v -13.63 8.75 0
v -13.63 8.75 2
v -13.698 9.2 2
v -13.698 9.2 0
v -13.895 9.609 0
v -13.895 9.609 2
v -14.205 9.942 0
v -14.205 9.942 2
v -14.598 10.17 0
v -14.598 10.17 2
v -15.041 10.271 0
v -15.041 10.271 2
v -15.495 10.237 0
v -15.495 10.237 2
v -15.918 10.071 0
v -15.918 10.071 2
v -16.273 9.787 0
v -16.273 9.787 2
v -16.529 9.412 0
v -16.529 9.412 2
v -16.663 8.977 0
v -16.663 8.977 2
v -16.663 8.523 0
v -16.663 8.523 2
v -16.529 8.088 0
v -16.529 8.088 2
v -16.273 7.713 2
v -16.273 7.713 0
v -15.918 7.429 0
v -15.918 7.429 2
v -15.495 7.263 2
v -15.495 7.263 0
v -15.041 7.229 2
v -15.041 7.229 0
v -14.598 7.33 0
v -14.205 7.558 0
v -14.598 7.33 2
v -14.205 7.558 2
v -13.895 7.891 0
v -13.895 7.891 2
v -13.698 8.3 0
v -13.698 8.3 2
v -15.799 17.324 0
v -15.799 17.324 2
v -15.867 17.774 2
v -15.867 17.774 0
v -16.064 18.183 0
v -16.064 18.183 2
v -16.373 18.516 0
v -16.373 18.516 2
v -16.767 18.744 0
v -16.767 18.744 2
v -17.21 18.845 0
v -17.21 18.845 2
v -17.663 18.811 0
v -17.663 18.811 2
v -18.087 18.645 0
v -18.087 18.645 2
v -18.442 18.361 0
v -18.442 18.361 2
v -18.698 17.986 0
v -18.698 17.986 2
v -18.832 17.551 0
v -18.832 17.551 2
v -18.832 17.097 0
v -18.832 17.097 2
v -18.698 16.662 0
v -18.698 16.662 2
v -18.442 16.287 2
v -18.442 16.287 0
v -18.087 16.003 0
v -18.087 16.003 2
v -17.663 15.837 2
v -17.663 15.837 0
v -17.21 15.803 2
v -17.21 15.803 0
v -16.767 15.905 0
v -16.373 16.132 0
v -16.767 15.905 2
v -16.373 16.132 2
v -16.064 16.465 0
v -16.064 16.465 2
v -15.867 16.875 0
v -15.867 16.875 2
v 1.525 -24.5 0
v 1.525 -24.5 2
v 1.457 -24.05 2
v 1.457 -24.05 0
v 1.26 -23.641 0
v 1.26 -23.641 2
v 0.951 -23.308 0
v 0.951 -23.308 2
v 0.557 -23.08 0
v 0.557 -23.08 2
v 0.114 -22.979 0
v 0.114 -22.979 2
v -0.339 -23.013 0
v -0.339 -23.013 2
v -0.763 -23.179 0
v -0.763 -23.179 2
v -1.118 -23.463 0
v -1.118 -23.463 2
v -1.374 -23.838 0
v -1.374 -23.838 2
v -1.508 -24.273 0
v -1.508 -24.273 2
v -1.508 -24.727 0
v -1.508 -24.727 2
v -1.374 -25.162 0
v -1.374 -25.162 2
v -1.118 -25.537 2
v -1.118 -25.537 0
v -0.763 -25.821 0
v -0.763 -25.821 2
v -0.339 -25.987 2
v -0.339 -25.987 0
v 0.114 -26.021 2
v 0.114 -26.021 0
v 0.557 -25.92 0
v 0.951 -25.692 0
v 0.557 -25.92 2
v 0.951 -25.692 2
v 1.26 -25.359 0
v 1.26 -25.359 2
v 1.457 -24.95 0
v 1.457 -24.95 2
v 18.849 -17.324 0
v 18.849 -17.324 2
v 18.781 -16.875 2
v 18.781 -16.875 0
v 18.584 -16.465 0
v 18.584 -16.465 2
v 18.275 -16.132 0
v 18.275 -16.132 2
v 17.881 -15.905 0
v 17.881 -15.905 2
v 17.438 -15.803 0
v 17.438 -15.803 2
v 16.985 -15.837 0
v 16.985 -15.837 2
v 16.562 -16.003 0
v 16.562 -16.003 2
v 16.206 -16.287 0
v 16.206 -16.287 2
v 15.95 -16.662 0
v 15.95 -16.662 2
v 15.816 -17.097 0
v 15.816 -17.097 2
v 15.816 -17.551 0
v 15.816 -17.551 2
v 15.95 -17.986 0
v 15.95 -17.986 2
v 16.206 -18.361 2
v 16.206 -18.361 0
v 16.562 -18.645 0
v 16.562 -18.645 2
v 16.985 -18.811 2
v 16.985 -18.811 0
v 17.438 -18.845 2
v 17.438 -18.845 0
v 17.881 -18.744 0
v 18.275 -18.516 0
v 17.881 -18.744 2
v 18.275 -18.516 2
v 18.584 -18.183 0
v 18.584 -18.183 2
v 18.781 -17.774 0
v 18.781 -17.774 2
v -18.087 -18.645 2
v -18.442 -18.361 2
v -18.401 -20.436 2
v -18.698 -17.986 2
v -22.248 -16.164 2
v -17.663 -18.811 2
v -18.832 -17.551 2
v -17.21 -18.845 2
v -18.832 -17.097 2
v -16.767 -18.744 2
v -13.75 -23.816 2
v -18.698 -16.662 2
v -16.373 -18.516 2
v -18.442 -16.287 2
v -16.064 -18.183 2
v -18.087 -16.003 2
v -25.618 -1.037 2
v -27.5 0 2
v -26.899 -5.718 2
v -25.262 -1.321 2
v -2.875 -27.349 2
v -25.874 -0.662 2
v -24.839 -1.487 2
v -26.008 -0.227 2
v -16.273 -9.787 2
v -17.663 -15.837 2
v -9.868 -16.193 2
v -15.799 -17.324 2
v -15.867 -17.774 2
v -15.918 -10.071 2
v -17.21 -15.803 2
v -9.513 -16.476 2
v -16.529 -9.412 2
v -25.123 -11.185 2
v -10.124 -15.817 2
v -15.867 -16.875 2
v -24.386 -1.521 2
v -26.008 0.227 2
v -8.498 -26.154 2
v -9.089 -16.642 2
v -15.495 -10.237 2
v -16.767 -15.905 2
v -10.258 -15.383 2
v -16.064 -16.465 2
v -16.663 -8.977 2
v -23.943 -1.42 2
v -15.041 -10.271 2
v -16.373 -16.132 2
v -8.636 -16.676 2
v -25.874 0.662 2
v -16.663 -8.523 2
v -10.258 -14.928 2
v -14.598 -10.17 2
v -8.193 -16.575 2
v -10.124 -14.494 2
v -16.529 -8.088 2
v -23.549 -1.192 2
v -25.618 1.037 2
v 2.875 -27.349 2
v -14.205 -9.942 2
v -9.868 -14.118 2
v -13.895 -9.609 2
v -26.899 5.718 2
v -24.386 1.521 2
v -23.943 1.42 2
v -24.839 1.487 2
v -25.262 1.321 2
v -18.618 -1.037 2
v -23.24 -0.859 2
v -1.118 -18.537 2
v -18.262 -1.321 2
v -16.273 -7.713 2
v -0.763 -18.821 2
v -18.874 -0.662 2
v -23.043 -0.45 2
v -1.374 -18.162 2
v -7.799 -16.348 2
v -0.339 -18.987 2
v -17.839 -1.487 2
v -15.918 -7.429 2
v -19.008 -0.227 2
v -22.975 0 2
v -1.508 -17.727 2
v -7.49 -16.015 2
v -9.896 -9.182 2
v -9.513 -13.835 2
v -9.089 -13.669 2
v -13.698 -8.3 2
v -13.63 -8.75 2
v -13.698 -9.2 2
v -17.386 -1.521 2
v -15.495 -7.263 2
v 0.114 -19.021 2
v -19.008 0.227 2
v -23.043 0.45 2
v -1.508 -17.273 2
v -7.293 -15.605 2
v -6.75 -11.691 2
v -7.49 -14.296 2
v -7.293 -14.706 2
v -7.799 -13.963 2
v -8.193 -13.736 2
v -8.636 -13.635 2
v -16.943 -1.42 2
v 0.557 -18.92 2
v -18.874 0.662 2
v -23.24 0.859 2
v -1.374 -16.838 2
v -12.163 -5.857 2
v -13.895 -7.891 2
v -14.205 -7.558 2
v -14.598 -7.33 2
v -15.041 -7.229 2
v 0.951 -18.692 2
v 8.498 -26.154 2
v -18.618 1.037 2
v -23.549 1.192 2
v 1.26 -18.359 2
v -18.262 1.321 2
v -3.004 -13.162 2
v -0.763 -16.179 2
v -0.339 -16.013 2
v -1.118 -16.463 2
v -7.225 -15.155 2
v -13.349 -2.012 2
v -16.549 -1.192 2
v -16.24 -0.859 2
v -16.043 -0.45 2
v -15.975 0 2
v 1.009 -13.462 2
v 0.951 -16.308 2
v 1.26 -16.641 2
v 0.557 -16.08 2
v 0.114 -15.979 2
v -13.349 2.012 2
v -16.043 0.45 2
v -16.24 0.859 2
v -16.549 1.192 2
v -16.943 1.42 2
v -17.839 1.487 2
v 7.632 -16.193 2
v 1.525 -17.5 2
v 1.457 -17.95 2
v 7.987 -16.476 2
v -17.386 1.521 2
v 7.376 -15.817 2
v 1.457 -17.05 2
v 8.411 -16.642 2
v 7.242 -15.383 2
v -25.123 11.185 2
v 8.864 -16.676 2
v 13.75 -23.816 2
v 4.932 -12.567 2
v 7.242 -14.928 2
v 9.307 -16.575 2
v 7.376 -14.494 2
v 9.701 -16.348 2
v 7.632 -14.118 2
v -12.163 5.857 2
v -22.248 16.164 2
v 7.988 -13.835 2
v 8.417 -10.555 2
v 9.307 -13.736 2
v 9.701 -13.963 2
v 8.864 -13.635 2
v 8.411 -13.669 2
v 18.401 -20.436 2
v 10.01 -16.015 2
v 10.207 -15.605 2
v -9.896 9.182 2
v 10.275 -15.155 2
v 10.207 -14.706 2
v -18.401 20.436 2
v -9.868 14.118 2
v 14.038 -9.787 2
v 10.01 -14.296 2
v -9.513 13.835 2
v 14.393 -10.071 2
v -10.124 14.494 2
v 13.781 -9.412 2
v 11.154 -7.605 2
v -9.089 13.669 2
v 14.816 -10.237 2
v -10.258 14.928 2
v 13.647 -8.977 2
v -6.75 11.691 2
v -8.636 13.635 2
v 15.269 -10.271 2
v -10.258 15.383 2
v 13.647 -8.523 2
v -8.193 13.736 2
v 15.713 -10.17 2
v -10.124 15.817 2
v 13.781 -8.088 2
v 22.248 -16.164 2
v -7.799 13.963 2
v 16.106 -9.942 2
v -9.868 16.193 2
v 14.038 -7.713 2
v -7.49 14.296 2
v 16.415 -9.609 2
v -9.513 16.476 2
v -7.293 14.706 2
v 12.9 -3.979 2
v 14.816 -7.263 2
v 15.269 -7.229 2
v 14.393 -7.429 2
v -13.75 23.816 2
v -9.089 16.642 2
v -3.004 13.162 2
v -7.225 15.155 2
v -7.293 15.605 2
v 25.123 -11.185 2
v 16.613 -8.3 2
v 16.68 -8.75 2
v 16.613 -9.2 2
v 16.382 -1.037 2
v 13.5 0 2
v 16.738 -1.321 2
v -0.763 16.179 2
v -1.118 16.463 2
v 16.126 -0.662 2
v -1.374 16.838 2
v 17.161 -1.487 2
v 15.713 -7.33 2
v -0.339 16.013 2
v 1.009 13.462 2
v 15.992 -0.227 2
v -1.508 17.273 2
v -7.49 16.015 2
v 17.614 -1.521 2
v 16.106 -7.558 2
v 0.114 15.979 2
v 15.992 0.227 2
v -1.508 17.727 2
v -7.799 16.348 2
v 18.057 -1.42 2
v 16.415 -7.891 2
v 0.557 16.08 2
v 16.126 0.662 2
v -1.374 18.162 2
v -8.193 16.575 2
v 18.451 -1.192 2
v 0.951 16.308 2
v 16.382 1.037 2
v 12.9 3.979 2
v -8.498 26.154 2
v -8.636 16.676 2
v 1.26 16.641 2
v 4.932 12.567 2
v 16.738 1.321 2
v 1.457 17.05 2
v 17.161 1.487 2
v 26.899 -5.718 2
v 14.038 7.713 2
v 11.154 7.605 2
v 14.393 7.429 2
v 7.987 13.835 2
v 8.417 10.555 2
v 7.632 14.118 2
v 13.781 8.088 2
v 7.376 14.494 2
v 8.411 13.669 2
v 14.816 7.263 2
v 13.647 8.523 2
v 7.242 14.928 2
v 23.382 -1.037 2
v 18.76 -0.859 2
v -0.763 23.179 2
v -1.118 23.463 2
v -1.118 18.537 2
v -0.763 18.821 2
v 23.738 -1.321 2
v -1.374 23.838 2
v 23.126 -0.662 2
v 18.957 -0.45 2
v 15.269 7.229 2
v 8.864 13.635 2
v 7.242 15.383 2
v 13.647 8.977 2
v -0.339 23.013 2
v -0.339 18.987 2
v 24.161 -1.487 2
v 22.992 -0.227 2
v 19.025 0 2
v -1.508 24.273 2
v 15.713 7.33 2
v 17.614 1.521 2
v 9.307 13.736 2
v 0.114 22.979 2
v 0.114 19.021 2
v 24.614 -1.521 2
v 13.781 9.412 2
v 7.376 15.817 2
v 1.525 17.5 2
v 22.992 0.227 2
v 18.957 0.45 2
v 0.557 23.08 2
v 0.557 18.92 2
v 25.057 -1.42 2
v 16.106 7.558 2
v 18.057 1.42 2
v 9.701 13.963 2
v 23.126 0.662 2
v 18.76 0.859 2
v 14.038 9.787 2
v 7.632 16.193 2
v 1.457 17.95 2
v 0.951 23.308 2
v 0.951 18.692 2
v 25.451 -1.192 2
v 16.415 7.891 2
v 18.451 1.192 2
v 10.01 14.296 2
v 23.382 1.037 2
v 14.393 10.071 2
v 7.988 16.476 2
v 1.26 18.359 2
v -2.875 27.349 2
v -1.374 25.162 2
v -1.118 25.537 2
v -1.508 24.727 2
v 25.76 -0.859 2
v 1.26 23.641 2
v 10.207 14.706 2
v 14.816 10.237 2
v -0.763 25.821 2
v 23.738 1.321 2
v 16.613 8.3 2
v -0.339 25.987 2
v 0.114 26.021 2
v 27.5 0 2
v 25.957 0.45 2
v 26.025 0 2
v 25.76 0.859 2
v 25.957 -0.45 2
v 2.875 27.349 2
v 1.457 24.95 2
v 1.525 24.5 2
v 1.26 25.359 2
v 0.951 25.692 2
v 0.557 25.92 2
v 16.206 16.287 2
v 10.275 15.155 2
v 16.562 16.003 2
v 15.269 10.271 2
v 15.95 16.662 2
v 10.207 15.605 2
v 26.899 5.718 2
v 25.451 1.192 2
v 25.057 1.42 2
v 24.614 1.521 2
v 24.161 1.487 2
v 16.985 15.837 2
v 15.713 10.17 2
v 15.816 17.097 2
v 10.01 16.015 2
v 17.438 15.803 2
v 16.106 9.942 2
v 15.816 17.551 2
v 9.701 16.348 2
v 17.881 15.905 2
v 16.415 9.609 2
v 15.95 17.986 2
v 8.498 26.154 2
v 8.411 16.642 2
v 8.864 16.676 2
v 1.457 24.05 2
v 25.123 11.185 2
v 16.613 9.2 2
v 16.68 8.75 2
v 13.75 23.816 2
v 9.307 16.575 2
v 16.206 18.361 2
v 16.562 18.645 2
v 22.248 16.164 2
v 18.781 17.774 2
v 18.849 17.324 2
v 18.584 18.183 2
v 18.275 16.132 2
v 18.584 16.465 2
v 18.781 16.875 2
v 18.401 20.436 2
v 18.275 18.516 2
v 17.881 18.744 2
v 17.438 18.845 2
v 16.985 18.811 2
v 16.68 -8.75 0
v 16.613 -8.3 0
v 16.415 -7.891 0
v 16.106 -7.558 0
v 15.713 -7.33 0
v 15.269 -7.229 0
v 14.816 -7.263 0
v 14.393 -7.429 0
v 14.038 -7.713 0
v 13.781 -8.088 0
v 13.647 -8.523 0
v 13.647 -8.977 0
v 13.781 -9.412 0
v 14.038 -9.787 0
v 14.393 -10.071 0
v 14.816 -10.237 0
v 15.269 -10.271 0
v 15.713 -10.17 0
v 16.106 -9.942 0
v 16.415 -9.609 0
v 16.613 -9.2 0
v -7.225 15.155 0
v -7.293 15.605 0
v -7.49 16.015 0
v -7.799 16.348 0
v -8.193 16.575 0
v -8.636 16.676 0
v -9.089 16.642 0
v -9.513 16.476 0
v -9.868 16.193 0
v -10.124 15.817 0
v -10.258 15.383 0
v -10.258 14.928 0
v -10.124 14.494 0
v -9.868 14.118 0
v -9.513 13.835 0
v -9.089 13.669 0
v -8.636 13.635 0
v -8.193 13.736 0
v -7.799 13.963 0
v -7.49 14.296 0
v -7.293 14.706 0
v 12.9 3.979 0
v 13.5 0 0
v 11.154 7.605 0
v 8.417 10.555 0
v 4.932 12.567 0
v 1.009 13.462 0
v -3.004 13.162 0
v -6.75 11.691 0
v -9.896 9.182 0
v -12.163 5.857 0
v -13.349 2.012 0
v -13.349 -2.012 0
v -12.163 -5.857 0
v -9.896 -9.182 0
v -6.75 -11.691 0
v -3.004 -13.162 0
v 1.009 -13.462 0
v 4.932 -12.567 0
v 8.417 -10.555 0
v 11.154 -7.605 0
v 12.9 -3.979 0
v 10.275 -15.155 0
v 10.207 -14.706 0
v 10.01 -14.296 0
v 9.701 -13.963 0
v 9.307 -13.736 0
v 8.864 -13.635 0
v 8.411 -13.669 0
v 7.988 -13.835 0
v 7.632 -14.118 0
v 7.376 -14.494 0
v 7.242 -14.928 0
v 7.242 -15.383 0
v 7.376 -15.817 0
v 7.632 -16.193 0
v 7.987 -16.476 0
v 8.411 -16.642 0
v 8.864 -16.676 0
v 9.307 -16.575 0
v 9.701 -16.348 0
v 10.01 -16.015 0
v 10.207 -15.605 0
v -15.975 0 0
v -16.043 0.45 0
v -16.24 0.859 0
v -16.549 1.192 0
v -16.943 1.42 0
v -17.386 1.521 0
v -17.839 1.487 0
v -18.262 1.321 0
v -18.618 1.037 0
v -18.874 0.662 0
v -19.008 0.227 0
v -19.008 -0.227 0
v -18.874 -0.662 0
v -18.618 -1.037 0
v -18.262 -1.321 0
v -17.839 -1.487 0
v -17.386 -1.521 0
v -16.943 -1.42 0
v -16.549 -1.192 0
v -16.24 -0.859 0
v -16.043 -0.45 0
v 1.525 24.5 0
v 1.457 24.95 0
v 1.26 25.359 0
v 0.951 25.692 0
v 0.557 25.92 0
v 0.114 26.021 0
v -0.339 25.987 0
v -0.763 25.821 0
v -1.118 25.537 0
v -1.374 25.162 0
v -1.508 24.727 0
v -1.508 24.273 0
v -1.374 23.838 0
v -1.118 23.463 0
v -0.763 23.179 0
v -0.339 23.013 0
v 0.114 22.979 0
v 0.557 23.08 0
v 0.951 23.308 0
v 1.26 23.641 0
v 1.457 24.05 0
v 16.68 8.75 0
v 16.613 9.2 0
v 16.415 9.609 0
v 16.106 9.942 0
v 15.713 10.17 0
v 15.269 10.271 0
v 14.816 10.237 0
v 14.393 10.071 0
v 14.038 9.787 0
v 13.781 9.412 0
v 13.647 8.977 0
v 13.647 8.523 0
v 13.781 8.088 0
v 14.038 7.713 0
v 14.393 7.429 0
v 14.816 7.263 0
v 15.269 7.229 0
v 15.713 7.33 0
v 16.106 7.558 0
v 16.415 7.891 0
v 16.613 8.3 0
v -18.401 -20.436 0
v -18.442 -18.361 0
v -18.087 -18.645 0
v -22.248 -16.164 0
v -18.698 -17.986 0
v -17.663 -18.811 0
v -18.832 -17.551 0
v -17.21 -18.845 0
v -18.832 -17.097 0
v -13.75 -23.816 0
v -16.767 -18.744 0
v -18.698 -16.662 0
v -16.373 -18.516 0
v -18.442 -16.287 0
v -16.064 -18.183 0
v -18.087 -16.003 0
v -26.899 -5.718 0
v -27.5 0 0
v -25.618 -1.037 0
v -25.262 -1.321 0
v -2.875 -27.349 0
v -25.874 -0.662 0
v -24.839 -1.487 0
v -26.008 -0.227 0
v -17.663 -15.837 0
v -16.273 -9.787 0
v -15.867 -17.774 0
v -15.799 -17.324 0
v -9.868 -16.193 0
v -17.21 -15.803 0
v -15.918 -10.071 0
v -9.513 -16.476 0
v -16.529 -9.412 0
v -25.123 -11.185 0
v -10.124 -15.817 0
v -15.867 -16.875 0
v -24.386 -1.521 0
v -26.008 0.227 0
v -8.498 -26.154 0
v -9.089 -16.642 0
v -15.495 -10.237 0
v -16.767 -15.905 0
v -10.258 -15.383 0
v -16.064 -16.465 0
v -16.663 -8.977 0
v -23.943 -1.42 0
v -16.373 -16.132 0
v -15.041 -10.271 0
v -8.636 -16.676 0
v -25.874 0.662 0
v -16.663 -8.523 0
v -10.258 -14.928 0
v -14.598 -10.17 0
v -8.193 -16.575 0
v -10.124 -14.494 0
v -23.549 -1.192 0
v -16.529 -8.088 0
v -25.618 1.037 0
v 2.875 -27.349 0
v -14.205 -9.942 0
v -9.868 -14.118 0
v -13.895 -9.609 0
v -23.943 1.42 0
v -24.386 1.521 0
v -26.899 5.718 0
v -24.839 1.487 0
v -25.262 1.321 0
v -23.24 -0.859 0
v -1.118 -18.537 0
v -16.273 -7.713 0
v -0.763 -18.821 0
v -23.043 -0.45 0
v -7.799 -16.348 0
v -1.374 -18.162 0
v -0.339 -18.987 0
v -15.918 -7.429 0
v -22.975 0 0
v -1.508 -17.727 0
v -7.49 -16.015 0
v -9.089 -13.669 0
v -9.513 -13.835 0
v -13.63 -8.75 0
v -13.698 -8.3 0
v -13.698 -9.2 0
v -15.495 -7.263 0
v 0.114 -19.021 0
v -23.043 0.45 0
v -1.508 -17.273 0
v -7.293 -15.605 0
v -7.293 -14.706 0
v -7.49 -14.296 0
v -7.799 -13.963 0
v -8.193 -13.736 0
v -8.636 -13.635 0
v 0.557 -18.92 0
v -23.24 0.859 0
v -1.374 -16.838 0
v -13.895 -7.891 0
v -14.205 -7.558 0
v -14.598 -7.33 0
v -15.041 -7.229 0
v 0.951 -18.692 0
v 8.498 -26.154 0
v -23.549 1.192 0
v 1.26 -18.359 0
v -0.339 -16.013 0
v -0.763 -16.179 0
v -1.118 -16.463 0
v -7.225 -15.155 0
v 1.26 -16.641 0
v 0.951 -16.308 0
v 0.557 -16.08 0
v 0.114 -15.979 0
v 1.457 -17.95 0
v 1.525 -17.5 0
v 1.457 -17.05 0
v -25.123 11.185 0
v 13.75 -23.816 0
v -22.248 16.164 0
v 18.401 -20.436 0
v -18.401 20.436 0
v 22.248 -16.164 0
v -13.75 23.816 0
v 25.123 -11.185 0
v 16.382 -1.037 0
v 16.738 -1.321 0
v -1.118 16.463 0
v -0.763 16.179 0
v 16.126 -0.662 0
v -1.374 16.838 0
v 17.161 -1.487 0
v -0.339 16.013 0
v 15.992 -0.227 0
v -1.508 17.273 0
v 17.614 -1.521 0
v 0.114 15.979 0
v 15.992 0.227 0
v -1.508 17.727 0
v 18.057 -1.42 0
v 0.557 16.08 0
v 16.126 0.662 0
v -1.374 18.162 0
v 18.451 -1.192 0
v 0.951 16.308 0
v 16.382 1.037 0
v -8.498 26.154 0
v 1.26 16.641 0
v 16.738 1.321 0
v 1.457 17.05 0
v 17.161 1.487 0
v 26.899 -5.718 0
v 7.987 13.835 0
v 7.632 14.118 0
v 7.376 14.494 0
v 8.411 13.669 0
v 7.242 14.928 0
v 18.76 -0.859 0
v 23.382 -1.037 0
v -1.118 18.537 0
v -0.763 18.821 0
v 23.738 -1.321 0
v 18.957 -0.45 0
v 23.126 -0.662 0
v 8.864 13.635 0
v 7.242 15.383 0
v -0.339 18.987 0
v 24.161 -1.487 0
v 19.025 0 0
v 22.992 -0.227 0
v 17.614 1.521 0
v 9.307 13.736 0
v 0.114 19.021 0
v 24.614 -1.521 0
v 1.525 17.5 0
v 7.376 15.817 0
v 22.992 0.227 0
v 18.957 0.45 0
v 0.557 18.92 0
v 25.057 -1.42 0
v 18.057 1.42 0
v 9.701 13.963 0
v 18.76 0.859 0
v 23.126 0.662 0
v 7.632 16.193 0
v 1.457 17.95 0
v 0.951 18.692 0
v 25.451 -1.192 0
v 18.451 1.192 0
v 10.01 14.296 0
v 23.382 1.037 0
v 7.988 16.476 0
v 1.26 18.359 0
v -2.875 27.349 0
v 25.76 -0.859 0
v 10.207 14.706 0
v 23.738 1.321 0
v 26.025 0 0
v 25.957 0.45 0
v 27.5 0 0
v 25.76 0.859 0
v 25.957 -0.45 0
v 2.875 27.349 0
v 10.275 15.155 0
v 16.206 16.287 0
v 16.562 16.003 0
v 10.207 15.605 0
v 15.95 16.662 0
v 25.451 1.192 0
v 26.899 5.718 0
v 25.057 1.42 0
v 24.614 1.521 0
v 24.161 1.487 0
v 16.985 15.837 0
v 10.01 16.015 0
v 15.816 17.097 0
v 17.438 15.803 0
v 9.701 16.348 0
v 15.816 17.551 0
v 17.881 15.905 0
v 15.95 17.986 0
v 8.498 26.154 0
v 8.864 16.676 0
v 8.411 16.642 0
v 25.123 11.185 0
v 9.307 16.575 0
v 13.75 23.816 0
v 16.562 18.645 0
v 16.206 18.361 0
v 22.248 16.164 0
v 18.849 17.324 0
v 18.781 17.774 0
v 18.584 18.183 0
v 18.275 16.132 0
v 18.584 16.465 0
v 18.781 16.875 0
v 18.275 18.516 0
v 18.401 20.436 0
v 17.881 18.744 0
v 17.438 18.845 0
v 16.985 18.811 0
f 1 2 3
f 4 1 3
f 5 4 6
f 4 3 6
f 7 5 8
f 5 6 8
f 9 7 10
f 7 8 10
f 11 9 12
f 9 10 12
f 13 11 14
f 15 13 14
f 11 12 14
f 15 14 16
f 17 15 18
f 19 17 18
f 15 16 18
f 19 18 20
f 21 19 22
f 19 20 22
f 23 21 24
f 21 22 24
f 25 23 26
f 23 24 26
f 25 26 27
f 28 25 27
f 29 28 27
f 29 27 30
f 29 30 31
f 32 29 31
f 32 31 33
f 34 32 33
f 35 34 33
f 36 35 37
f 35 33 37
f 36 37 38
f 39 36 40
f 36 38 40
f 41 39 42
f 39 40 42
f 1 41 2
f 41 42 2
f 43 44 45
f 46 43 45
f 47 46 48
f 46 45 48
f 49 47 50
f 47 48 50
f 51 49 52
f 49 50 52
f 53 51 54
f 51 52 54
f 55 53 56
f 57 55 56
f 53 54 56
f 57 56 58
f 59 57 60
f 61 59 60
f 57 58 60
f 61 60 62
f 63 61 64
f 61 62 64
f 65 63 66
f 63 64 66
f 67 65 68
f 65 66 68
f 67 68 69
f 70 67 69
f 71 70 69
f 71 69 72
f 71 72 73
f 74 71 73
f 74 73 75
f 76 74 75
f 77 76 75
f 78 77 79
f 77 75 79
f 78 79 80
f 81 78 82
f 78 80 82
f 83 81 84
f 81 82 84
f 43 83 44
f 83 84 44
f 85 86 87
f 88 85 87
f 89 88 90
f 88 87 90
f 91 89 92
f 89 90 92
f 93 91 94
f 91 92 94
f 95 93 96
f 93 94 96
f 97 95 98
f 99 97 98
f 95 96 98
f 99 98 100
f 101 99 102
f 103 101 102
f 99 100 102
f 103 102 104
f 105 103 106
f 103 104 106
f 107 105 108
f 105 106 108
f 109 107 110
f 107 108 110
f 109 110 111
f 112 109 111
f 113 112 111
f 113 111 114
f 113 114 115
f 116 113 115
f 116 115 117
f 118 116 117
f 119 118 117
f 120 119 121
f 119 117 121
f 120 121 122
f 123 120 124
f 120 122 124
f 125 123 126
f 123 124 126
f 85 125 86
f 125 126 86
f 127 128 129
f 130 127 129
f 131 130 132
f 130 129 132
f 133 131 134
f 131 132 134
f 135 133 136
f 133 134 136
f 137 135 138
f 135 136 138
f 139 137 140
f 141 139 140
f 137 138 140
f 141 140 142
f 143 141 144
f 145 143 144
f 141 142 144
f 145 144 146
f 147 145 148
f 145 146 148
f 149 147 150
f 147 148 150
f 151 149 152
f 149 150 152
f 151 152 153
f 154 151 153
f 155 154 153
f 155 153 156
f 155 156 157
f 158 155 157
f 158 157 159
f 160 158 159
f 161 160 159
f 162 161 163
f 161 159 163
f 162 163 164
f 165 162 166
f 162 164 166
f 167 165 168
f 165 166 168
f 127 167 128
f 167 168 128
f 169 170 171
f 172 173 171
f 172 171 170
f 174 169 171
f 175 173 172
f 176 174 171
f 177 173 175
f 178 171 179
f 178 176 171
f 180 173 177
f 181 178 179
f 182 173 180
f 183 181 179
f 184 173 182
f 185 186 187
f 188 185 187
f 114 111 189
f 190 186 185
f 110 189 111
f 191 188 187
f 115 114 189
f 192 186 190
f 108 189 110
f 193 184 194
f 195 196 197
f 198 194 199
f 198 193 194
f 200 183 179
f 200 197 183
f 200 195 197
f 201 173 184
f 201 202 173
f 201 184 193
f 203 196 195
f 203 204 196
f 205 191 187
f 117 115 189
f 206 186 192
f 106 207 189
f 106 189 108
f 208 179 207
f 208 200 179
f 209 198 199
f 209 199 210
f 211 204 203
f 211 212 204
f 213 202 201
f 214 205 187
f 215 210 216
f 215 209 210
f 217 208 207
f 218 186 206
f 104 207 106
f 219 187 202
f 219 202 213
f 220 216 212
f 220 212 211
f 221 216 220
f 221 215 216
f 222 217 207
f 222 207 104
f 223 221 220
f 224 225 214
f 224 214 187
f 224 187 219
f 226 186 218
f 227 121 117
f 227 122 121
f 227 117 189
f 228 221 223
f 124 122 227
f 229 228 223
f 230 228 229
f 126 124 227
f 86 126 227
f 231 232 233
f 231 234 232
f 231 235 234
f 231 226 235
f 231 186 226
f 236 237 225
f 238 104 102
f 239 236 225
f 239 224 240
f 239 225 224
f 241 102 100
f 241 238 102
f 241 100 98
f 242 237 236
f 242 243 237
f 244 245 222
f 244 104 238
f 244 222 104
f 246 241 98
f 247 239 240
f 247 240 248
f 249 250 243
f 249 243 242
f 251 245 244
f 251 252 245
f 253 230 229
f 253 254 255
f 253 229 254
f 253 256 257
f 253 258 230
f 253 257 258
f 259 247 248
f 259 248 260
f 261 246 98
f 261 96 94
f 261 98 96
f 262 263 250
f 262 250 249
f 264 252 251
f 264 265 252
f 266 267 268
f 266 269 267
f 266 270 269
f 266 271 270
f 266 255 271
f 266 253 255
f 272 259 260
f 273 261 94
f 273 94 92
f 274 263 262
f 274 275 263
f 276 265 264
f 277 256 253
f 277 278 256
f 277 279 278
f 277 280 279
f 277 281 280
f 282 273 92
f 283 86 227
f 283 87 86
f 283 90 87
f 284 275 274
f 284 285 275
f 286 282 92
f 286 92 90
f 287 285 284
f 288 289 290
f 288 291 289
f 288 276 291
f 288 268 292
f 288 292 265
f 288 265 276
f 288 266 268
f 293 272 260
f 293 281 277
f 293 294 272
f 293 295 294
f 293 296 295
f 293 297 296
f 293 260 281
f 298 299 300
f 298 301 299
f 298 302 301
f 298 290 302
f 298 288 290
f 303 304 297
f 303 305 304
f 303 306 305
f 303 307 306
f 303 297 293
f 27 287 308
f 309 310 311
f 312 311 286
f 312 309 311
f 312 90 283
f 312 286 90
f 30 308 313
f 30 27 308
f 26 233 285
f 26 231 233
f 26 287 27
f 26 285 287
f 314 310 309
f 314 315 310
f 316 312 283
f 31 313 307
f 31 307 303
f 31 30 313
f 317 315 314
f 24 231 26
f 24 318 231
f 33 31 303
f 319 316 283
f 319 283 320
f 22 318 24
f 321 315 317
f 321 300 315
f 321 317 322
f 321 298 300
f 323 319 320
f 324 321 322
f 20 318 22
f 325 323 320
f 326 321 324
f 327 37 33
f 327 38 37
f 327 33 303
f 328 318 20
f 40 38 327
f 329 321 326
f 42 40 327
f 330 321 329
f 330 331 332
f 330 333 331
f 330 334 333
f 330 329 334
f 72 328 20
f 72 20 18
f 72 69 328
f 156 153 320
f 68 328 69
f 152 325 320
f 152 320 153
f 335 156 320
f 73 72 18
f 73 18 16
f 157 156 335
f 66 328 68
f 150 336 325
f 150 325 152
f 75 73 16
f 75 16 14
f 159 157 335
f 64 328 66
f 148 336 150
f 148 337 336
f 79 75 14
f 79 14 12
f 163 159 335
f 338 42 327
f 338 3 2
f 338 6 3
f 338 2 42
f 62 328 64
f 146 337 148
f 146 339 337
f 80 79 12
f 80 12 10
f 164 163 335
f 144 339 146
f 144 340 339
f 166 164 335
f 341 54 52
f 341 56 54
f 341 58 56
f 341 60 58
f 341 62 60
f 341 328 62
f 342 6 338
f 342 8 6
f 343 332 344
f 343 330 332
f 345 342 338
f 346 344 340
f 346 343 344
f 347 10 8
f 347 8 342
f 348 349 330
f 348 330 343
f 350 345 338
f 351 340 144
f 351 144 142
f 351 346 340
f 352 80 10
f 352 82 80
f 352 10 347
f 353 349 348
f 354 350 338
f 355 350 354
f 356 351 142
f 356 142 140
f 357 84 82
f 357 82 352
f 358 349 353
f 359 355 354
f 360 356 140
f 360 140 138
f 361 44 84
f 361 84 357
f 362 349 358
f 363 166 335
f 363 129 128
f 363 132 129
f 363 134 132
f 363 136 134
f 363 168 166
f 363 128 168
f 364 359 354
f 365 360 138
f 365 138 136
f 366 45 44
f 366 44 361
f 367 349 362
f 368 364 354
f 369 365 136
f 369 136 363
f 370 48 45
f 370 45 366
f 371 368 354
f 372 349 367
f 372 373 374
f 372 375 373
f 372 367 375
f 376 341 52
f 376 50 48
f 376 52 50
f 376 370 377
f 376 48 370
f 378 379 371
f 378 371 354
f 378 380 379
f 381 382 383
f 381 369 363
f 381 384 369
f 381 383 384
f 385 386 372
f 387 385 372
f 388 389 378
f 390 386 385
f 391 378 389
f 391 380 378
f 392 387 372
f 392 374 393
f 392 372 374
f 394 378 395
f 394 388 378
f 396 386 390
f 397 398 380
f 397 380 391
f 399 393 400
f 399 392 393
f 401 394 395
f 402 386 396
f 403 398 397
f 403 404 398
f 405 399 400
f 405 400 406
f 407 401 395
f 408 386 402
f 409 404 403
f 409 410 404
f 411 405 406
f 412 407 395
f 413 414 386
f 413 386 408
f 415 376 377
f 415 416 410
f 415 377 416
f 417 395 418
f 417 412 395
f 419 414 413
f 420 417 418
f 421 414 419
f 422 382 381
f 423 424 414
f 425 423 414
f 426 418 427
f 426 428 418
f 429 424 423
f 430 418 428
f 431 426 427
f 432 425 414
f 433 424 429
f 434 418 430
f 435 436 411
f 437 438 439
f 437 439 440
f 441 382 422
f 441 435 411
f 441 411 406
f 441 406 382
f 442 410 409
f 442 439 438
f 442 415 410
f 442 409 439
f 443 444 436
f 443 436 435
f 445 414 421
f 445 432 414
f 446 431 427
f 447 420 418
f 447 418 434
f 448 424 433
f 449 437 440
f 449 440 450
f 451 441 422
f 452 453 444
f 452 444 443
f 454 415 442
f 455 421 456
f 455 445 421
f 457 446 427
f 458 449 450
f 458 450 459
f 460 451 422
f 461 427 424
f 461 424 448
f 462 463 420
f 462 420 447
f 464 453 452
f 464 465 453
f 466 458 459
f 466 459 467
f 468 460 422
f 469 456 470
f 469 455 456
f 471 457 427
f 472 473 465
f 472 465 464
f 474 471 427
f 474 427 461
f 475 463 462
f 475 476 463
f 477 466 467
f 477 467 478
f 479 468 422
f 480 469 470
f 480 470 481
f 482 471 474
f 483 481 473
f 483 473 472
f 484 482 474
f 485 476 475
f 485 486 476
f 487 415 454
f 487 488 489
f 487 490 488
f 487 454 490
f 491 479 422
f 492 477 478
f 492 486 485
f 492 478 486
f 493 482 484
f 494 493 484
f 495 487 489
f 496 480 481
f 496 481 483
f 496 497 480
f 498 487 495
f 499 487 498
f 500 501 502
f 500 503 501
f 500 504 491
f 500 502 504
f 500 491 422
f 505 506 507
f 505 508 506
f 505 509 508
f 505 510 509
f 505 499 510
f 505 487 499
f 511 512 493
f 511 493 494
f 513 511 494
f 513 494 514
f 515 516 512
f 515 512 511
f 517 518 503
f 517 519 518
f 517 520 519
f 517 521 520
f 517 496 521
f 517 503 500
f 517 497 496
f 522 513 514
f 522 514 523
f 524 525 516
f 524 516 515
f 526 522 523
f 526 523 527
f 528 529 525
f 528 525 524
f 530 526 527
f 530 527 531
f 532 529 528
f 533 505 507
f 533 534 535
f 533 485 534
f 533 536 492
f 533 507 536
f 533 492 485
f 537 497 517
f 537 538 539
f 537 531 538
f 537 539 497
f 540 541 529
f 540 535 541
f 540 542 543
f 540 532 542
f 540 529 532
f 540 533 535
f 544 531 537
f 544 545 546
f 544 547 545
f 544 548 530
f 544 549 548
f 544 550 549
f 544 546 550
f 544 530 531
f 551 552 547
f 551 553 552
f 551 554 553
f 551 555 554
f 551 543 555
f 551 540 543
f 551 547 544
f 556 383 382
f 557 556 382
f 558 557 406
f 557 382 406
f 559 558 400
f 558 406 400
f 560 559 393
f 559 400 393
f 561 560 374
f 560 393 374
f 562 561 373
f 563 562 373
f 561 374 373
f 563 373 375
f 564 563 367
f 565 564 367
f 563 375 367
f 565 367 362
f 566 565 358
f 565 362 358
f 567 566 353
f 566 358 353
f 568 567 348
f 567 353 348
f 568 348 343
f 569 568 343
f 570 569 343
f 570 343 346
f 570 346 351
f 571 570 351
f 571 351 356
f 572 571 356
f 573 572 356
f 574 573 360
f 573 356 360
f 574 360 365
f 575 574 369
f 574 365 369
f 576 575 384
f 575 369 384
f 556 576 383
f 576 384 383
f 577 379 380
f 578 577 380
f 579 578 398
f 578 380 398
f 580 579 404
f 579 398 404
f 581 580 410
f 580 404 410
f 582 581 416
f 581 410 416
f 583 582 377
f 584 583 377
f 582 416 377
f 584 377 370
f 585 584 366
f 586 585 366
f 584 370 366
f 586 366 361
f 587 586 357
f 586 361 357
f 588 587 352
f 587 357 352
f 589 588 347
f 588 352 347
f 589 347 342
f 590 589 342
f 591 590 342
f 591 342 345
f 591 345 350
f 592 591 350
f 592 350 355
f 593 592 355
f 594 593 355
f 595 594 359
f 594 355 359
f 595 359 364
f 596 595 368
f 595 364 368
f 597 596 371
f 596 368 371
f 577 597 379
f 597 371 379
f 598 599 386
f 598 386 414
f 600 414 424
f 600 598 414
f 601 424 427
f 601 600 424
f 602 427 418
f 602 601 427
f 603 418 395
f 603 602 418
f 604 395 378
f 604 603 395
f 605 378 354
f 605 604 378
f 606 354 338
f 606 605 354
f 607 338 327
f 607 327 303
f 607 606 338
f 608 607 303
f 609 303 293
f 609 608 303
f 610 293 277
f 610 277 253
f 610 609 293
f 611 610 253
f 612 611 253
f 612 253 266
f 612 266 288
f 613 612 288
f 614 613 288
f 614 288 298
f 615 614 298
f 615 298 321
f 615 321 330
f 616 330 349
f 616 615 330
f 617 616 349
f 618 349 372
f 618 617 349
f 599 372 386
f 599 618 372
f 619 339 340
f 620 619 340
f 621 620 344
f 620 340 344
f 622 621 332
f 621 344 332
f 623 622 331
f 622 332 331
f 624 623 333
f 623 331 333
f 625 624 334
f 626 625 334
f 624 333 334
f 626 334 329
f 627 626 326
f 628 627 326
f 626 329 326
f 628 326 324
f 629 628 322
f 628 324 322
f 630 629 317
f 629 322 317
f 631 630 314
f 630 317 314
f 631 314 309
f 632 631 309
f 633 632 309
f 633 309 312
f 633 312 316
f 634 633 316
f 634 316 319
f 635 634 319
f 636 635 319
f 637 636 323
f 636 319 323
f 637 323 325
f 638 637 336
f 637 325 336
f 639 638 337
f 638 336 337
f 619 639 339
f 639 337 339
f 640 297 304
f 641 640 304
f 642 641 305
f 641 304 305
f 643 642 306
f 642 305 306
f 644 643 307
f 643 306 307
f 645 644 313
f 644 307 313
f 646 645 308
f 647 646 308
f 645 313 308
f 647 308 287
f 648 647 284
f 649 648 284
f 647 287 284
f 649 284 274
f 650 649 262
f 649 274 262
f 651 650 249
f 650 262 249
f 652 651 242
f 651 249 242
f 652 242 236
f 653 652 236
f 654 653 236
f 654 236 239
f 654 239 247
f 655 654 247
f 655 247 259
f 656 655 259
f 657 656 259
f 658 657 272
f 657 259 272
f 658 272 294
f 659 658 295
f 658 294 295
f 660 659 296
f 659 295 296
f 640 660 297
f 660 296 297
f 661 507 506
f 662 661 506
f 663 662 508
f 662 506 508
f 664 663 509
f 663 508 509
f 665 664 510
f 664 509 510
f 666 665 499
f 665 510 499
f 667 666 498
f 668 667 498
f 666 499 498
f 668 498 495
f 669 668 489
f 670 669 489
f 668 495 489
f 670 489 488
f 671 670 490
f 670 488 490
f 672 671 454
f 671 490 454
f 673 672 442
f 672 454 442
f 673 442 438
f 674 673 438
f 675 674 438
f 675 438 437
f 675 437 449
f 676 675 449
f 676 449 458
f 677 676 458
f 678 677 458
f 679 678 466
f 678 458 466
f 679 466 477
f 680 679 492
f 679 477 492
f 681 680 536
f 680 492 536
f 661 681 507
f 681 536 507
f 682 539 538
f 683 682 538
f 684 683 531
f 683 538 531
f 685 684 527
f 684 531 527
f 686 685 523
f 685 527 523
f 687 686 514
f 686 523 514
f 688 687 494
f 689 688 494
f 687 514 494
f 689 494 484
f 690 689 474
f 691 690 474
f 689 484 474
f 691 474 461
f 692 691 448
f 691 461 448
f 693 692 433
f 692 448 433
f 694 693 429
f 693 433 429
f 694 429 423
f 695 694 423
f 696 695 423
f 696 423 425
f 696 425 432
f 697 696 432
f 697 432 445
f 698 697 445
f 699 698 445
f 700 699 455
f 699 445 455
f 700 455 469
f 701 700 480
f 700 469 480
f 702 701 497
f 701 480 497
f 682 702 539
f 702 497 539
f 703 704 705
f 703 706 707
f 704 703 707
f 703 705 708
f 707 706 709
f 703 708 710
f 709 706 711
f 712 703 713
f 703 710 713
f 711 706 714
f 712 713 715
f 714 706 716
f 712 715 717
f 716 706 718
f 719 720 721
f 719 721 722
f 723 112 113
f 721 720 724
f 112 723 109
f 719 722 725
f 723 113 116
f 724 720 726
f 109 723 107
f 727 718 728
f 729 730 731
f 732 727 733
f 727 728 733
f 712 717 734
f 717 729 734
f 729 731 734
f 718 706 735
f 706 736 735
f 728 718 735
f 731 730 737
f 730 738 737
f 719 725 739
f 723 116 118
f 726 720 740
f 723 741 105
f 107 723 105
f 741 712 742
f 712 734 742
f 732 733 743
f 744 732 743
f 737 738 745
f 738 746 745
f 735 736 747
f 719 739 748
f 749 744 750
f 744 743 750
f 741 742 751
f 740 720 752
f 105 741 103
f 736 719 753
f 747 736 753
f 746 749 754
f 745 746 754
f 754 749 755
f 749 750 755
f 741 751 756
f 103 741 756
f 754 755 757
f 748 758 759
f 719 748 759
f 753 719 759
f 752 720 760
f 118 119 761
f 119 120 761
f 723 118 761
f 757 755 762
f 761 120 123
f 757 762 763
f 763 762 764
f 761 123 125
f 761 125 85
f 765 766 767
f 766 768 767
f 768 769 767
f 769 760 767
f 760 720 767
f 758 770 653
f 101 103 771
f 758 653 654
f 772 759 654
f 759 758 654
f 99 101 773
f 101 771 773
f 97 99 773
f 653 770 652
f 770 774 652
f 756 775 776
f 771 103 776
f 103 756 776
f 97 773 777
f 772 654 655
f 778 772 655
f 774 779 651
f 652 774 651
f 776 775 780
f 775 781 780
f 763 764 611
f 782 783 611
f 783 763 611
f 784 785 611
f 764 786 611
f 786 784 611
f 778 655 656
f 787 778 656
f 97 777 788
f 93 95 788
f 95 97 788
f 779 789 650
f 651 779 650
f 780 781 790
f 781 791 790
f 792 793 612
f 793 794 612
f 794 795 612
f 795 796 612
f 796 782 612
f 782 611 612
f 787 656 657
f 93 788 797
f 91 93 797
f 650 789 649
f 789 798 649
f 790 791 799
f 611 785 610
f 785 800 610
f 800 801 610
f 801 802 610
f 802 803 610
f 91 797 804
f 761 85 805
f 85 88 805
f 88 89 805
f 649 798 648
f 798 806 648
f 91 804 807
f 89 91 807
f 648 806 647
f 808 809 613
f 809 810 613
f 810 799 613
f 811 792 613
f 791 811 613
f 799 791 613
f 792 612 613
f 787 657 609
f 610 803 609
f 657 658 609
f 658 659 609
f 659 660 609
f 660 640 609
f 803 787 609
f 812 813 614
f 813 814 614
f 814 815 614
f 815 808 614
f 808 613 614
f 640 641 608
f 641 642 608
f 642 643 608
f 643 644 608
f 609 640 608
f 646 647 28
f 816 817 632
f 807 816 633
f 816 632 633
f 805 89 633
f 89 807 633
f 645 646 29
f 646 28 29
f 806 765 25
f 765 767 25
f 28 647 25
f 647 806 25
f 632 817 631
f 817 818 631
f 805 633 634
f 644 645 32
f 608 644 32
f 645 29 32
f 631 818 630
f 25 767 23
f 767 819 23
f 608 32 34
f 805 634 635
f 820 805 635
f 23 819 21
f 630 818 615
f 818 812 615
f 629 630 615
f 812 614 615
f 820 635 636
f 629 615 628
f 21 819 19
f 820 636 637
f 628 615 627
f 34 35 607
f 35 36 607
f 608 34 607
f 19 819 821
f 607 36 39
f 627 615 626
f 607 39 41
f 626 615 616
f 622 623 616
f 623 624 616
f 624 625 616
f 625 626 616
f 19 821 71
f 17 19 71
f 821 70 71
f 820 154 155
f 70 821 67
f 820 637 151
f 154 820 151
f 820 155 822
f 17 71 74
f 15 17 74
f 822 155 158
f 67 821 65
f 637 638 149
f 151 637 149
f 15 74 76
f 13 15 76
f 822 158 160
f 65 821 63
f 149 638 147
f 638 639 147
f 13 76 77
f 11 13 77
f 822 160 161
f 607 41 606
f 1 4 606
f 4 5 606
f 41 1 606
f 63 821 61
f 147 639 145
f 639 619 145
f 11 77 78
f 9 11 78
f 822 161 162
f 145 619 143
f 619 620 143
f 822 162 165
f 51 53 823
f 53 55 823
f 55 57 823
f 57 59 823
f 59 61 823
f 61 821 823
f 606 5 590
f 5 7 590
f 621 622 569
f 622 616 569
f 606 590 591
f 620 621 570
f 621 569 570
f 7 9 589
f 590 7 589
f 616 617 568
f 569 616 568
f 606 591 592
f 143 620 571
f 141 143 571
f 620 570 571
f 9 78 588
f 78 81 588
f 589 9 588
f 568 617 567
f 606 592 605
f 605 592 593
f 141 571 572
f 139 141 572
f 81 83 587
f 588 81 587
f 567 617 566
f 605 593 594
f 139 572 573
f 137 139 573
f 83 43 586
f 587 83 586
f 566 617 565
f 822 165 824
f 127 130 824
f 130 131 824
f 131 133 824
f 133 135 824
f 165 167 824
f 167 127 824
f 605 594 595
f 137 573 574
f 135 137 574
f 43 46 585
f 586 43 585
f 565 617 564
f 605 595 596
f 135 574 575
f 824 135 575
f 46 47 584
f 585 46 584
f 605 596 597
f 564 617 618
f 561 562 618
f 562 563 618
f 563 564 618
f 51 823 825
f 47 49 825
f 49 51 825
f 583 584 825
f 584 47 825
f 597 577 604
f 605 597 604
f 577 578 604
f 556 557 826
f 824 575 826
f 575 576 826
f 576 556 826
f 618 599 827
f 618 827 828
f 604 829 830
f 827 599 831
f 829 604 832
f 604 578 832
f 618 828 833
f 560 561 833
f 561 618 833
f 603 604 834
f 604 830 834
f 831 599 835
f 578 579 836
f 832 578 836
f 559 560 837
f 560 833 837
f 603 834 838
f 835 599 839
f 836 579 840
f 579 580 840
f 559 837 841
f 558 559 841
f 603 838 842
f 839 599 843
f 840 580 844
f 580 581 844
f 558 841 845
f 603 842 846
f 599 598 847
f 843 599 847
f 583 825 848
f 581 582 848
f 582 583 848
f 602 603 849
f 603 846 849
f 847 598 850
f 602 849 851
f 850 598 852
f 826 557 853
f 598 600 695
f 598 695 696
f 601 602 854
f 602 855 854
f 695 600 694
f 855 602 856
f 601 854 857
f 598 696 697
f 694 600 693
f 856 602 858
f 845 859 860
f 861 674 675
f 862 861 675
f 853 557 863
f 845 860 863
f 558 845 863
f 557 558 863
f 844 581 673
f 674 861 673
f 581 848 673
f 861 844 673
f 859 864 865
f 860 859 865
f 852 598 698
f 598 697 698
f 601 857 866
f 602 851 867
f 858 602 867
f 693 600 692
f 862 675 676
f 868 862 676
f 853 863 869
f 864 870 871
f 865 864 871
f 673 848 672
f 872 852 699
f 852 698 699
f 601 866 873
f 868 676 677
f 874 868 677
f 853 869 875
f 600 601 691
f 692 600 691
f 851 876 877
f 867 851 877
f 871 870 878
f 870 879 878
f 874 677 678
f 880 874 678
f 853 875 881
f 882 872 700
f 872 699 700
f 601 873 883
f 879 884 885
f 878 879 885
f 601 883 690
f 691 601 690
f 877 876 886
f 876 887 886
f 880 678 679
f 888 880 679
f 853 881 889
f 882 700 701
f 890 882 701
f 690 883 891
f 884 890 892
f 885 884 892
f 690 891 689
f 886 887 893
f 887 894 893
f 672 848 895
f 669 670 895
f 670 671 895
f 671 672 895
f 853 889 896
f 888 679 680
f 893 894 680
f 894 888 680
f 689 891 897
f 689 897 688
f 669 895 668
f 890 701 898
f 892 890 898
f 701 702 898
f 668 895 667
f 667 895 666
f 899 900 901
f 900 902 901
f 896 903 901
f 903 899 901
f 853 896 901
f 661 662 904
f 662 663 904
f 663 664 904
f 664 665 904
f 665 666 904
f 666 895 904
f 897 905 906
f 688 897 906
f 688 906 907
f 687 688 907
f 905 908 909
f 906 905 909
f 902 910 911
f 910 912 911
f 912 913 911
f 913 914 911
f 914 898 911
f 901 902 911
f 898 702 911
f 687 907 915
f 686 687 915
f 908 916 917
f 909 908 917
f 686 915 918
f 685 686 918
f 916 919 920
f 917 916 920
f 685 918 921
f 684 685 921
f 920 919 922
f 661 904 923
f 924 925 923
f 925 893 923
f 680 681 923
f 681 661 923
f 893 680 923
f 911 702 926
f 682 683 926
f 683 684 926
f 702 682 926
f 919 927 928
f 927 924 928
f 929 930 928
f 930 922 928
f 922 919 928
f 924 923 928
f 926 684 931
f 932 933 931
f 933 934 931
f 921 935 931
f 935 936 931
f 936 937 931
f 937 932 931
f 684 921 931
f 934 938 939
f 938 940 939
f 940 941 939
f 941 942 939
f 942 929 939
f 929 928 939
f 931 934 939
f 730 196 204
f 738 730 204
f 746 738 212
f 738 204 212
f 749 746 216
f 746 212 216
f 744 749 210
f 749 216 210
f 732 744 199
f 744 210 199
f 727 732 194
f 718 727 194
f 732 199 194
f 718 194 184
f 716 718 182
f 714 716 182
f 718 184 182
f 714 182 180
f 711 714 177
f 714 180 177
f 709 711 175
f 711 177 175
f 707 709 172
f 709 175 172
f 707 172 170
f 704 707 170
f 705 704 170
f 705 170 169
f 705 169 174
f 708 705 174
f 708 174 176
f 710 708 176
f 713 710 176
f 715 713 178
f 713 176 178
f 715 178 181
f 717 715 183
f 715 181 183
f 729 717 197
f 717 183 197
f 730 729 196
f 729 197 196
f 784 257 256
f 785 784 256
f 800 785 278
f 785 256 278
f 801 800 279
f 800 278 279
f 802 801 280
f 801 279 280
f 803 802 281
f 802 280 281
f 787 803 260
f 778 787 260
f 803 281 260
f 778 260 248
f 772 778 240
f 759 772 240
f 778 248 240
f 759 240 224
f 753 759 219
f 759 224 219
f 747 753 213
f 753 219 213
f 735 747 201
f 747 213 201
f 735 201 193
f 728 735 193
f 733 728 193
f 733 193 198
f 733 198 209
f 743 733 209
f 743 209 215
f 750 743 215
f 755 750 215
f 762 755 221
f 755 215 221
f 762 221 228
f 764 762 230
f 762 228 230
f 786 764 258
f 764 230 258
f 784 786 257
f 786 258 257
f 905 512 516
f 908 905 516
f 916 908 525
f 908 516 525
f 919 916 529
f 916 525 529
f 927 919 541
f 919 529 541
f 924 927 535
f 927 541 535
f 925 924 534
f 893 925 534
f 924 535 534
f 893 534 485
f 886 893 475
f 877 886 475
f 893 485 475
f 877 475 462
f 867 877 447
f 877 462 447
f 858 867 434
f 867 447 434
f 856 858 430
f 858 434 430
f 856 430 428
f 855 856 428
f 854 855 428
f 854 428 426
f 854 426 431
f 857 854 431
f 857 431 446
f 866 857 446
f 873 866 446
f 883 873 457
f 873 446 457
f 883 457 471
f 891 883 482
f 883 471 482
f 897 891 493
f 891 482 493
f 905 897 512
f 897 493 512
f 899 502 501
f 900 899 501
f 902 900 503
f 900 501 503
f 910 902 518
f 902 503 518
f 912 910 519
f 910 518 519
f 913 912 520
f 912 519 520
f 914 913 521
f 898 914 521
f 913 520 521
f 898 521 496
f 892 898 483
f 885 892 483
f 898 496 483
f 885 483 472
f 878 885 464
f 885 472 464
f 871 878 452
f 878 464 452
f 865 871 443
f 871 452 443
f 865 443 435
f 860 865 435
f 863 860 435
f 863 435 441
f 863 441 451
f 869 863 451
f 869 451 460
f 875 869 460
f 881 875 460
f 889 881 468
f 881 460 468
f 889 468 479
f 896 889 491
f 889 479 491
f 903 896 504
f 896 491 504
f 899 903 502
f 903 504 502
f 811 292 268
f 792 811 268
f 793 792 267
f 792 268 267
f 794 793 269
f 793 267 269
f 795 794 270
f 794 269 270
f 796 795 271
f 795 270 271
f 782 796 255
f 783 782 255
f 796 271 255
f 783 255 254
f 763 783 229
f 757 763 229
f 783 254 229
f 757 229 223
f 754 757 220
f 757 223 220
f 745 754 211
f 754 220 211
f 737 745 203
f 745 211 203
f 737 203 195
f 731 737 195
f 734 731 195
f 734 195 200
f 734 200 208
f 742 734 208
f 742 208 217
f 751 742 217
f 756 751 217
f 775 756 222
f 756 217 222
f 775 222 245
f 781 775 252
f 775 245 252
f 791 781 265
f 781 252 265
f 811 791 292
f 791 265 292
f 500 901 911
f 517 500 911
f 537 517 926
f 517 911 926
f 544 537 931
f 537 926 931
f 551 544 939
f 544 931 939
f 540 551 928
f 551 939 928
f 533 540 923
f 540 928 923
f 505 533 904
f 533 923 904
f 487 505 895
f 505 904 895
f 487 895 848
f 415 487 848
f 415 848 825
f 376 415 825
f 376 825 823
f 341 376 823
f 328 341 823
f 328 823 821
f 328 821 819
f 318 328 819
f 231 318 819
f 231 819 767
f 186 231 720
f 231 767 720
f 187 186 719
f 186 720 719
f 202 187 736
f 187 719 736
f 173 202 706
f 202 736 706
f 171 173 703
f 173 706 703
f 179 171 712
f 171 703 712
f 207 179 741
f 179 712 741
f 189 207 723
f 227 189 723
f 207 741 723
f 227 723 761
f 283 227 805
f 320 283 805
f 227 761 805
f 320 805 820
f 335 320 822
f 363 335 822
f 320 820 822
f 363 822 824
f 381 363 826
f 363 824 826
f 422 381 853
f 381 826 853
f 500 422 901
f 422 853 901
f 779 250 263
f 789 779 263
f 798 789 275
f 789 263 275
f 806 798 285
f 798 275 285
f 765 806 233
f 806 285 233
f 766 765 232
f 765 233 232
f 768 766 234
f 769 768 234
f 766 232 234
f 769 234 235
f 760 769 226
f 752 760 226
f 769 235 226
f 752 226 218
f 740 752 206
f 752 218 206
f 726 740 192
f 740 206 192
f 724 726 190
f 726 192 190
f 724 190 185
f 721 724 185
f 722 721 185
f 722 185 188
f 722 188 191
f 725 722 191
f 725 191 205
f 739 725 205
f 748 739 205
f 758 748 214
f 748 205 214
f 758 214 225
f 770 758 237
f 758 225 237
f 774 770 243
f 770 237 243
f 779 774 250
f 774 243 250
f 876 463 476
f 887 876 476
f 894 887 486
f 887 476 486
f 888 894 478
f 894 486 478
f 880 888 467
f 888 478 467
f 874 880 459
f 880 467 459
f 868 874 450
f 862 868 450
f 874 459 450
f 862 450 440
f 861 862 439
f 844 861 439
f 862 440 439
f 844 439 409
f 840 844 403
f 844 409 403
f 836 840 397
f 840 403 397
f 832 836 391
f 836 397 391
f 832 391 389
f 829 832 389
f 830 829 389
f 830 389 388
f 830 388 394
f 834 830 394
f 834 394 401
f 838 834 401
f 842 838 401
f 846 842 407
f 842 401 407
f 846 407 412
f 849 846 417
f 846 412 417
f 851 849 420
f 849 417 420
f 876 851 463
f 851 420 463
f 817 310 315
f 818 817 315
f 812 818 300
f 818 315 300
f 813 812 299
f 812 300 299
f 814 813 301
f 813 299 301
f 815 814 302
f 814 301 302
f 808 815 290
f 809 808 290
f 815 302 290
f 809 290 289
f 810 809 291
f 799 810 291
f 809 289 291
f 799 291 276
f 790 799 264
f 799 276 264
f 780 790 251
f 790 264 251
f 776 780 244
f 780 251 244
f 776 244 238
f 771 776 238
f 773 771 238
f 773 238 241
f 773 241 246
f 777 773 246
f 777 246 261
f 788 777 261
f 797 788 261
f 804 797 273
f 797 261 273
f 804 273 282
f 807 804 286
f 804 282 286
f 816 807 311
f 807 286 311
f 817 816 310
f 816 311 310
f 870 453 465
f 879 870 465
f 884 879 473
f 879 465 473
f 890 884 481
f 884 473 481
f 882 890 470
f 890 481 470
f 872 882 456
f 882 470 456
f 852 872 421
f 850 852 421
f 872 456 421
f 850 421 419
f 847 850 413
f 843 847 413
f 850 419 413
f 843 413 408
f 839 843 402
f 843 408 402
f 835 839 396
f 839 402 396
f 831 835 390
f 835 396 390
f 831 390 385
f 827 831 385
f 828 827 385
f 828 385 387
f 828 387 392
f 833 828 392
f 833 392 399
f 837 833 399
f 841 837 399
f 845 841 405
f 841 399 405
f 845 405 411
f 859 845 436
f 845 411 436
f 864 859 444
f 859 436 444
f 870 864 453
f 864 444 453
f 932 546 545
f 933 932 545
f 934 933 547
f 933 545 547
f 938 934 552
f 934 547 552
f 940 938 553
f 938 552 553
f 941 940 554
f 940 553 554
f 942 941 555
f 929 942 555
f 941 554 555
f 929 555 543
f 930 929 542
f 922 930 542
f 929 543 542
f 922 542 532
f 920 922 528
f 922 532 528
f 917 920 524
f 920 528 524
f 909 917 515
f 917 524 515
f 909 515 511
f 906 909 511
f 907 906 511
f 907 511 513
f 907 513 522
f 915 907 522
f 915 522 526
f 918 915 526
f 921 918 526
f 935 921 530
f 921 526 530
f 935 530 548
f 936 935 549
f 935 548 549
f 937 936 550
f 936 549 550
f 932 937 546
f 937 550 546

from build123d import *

# Parameters (mm, degrees)
SKETCH_1_R          = 27.5
SKETCH_1_R_2        = 13.5
EXTRUDE_1_DEPTH     = 2
SKETCH_2_R          = 1.525
CUT_EXTRUDE_1_DEPTH = 2
SKETCH_3_R          = 1.525
CUT_EXTRUDE_2_DEPTH = 2


with BuildPart() as part:
    # 草图1 → 凸台-拉伸1 (new body)
    with BuildSketch(Plane.XY):
        Circle(SKETCH_1_R)
        Circle(SKETCH_1_R_2, mode=Mode.SUBTRACT)
    extrude(amount=EXTRUDE_1_DEPTH)

    # 草图2 → 切除-拉伸1 (cut)
    with BuildSketch(Plane.XY.offset(2)):
        with Locations((0, 17.5)):
            Circle(SKETCH_2_R)
        with Locations((8.75, 15.155444566)):
            Circle(SKETCH_2_R)
        with Locations((15.155444566, 8.75)):
            Circle(SKETCH_2_R)
        with Locations((17.5, 0)):
            Circle(SKETCH_2_R)
        with Locations((15.155444566, -8.75)):
            Circle(SKETCH_2_R)
        with Locations((8.75, -15.155444566)):
            Circle(SKETCH_2_R)
        with Locations((0, -17.5)):
            Circle(SKETCH_2_R)
        with Locations((-8.75, -15.155444566)):
            Circle(SKETCH_2_R)
        with Locations((-15.155444566, -8.75)):
            Circle(SKETCH_2_R)
        with Locations((-17.5, 0)):
            Circle(SKETCH_2_R)
        with Locations((-15.155444566, 8.75)):
            Circle(SKETCH_2_R)
        with Locations((-8.75, 15.155444566)):
            Circle(SKETCH_2_R)
    extrude(amount=-CUT_EXTRUDE_1_DEPTH, mode=Mode.SUBTRACT)

    # 草图3 → 切除-拉伸2 (cut)
    with BuildSketch(Plane.XY.offset(2)):
        with Locations((0, 24.5)):
            Circle(SKETCH_3_R)
        with Locations((17.324116139, 17.324116139)):
            Circle(SKETCH_3_R)
        with Locations((24.5, 0)):
            Circle(SKETCH_3_R)
        with Locations((17.324116139, -17.324116139)):
            Circle(SKETCH_3_R)
        with Locations((0, -24.5)):
            Circle(SKETCH_3_R)
        with Locations((-17.324116139, -17.324116139)):
            Circle(SKETCH_3_R)
        with Locations((-24.5, 0)):
            Circle(SKETCH_3_R)
        with Locations((-17.324116139, 17.324116139)):
            Circle(SKETCH_3_R)
    extrude(amount=-CUT_EXTRUDE_2_DEPTH, mode=Mode.SUBTRACT)


solid = part.part
